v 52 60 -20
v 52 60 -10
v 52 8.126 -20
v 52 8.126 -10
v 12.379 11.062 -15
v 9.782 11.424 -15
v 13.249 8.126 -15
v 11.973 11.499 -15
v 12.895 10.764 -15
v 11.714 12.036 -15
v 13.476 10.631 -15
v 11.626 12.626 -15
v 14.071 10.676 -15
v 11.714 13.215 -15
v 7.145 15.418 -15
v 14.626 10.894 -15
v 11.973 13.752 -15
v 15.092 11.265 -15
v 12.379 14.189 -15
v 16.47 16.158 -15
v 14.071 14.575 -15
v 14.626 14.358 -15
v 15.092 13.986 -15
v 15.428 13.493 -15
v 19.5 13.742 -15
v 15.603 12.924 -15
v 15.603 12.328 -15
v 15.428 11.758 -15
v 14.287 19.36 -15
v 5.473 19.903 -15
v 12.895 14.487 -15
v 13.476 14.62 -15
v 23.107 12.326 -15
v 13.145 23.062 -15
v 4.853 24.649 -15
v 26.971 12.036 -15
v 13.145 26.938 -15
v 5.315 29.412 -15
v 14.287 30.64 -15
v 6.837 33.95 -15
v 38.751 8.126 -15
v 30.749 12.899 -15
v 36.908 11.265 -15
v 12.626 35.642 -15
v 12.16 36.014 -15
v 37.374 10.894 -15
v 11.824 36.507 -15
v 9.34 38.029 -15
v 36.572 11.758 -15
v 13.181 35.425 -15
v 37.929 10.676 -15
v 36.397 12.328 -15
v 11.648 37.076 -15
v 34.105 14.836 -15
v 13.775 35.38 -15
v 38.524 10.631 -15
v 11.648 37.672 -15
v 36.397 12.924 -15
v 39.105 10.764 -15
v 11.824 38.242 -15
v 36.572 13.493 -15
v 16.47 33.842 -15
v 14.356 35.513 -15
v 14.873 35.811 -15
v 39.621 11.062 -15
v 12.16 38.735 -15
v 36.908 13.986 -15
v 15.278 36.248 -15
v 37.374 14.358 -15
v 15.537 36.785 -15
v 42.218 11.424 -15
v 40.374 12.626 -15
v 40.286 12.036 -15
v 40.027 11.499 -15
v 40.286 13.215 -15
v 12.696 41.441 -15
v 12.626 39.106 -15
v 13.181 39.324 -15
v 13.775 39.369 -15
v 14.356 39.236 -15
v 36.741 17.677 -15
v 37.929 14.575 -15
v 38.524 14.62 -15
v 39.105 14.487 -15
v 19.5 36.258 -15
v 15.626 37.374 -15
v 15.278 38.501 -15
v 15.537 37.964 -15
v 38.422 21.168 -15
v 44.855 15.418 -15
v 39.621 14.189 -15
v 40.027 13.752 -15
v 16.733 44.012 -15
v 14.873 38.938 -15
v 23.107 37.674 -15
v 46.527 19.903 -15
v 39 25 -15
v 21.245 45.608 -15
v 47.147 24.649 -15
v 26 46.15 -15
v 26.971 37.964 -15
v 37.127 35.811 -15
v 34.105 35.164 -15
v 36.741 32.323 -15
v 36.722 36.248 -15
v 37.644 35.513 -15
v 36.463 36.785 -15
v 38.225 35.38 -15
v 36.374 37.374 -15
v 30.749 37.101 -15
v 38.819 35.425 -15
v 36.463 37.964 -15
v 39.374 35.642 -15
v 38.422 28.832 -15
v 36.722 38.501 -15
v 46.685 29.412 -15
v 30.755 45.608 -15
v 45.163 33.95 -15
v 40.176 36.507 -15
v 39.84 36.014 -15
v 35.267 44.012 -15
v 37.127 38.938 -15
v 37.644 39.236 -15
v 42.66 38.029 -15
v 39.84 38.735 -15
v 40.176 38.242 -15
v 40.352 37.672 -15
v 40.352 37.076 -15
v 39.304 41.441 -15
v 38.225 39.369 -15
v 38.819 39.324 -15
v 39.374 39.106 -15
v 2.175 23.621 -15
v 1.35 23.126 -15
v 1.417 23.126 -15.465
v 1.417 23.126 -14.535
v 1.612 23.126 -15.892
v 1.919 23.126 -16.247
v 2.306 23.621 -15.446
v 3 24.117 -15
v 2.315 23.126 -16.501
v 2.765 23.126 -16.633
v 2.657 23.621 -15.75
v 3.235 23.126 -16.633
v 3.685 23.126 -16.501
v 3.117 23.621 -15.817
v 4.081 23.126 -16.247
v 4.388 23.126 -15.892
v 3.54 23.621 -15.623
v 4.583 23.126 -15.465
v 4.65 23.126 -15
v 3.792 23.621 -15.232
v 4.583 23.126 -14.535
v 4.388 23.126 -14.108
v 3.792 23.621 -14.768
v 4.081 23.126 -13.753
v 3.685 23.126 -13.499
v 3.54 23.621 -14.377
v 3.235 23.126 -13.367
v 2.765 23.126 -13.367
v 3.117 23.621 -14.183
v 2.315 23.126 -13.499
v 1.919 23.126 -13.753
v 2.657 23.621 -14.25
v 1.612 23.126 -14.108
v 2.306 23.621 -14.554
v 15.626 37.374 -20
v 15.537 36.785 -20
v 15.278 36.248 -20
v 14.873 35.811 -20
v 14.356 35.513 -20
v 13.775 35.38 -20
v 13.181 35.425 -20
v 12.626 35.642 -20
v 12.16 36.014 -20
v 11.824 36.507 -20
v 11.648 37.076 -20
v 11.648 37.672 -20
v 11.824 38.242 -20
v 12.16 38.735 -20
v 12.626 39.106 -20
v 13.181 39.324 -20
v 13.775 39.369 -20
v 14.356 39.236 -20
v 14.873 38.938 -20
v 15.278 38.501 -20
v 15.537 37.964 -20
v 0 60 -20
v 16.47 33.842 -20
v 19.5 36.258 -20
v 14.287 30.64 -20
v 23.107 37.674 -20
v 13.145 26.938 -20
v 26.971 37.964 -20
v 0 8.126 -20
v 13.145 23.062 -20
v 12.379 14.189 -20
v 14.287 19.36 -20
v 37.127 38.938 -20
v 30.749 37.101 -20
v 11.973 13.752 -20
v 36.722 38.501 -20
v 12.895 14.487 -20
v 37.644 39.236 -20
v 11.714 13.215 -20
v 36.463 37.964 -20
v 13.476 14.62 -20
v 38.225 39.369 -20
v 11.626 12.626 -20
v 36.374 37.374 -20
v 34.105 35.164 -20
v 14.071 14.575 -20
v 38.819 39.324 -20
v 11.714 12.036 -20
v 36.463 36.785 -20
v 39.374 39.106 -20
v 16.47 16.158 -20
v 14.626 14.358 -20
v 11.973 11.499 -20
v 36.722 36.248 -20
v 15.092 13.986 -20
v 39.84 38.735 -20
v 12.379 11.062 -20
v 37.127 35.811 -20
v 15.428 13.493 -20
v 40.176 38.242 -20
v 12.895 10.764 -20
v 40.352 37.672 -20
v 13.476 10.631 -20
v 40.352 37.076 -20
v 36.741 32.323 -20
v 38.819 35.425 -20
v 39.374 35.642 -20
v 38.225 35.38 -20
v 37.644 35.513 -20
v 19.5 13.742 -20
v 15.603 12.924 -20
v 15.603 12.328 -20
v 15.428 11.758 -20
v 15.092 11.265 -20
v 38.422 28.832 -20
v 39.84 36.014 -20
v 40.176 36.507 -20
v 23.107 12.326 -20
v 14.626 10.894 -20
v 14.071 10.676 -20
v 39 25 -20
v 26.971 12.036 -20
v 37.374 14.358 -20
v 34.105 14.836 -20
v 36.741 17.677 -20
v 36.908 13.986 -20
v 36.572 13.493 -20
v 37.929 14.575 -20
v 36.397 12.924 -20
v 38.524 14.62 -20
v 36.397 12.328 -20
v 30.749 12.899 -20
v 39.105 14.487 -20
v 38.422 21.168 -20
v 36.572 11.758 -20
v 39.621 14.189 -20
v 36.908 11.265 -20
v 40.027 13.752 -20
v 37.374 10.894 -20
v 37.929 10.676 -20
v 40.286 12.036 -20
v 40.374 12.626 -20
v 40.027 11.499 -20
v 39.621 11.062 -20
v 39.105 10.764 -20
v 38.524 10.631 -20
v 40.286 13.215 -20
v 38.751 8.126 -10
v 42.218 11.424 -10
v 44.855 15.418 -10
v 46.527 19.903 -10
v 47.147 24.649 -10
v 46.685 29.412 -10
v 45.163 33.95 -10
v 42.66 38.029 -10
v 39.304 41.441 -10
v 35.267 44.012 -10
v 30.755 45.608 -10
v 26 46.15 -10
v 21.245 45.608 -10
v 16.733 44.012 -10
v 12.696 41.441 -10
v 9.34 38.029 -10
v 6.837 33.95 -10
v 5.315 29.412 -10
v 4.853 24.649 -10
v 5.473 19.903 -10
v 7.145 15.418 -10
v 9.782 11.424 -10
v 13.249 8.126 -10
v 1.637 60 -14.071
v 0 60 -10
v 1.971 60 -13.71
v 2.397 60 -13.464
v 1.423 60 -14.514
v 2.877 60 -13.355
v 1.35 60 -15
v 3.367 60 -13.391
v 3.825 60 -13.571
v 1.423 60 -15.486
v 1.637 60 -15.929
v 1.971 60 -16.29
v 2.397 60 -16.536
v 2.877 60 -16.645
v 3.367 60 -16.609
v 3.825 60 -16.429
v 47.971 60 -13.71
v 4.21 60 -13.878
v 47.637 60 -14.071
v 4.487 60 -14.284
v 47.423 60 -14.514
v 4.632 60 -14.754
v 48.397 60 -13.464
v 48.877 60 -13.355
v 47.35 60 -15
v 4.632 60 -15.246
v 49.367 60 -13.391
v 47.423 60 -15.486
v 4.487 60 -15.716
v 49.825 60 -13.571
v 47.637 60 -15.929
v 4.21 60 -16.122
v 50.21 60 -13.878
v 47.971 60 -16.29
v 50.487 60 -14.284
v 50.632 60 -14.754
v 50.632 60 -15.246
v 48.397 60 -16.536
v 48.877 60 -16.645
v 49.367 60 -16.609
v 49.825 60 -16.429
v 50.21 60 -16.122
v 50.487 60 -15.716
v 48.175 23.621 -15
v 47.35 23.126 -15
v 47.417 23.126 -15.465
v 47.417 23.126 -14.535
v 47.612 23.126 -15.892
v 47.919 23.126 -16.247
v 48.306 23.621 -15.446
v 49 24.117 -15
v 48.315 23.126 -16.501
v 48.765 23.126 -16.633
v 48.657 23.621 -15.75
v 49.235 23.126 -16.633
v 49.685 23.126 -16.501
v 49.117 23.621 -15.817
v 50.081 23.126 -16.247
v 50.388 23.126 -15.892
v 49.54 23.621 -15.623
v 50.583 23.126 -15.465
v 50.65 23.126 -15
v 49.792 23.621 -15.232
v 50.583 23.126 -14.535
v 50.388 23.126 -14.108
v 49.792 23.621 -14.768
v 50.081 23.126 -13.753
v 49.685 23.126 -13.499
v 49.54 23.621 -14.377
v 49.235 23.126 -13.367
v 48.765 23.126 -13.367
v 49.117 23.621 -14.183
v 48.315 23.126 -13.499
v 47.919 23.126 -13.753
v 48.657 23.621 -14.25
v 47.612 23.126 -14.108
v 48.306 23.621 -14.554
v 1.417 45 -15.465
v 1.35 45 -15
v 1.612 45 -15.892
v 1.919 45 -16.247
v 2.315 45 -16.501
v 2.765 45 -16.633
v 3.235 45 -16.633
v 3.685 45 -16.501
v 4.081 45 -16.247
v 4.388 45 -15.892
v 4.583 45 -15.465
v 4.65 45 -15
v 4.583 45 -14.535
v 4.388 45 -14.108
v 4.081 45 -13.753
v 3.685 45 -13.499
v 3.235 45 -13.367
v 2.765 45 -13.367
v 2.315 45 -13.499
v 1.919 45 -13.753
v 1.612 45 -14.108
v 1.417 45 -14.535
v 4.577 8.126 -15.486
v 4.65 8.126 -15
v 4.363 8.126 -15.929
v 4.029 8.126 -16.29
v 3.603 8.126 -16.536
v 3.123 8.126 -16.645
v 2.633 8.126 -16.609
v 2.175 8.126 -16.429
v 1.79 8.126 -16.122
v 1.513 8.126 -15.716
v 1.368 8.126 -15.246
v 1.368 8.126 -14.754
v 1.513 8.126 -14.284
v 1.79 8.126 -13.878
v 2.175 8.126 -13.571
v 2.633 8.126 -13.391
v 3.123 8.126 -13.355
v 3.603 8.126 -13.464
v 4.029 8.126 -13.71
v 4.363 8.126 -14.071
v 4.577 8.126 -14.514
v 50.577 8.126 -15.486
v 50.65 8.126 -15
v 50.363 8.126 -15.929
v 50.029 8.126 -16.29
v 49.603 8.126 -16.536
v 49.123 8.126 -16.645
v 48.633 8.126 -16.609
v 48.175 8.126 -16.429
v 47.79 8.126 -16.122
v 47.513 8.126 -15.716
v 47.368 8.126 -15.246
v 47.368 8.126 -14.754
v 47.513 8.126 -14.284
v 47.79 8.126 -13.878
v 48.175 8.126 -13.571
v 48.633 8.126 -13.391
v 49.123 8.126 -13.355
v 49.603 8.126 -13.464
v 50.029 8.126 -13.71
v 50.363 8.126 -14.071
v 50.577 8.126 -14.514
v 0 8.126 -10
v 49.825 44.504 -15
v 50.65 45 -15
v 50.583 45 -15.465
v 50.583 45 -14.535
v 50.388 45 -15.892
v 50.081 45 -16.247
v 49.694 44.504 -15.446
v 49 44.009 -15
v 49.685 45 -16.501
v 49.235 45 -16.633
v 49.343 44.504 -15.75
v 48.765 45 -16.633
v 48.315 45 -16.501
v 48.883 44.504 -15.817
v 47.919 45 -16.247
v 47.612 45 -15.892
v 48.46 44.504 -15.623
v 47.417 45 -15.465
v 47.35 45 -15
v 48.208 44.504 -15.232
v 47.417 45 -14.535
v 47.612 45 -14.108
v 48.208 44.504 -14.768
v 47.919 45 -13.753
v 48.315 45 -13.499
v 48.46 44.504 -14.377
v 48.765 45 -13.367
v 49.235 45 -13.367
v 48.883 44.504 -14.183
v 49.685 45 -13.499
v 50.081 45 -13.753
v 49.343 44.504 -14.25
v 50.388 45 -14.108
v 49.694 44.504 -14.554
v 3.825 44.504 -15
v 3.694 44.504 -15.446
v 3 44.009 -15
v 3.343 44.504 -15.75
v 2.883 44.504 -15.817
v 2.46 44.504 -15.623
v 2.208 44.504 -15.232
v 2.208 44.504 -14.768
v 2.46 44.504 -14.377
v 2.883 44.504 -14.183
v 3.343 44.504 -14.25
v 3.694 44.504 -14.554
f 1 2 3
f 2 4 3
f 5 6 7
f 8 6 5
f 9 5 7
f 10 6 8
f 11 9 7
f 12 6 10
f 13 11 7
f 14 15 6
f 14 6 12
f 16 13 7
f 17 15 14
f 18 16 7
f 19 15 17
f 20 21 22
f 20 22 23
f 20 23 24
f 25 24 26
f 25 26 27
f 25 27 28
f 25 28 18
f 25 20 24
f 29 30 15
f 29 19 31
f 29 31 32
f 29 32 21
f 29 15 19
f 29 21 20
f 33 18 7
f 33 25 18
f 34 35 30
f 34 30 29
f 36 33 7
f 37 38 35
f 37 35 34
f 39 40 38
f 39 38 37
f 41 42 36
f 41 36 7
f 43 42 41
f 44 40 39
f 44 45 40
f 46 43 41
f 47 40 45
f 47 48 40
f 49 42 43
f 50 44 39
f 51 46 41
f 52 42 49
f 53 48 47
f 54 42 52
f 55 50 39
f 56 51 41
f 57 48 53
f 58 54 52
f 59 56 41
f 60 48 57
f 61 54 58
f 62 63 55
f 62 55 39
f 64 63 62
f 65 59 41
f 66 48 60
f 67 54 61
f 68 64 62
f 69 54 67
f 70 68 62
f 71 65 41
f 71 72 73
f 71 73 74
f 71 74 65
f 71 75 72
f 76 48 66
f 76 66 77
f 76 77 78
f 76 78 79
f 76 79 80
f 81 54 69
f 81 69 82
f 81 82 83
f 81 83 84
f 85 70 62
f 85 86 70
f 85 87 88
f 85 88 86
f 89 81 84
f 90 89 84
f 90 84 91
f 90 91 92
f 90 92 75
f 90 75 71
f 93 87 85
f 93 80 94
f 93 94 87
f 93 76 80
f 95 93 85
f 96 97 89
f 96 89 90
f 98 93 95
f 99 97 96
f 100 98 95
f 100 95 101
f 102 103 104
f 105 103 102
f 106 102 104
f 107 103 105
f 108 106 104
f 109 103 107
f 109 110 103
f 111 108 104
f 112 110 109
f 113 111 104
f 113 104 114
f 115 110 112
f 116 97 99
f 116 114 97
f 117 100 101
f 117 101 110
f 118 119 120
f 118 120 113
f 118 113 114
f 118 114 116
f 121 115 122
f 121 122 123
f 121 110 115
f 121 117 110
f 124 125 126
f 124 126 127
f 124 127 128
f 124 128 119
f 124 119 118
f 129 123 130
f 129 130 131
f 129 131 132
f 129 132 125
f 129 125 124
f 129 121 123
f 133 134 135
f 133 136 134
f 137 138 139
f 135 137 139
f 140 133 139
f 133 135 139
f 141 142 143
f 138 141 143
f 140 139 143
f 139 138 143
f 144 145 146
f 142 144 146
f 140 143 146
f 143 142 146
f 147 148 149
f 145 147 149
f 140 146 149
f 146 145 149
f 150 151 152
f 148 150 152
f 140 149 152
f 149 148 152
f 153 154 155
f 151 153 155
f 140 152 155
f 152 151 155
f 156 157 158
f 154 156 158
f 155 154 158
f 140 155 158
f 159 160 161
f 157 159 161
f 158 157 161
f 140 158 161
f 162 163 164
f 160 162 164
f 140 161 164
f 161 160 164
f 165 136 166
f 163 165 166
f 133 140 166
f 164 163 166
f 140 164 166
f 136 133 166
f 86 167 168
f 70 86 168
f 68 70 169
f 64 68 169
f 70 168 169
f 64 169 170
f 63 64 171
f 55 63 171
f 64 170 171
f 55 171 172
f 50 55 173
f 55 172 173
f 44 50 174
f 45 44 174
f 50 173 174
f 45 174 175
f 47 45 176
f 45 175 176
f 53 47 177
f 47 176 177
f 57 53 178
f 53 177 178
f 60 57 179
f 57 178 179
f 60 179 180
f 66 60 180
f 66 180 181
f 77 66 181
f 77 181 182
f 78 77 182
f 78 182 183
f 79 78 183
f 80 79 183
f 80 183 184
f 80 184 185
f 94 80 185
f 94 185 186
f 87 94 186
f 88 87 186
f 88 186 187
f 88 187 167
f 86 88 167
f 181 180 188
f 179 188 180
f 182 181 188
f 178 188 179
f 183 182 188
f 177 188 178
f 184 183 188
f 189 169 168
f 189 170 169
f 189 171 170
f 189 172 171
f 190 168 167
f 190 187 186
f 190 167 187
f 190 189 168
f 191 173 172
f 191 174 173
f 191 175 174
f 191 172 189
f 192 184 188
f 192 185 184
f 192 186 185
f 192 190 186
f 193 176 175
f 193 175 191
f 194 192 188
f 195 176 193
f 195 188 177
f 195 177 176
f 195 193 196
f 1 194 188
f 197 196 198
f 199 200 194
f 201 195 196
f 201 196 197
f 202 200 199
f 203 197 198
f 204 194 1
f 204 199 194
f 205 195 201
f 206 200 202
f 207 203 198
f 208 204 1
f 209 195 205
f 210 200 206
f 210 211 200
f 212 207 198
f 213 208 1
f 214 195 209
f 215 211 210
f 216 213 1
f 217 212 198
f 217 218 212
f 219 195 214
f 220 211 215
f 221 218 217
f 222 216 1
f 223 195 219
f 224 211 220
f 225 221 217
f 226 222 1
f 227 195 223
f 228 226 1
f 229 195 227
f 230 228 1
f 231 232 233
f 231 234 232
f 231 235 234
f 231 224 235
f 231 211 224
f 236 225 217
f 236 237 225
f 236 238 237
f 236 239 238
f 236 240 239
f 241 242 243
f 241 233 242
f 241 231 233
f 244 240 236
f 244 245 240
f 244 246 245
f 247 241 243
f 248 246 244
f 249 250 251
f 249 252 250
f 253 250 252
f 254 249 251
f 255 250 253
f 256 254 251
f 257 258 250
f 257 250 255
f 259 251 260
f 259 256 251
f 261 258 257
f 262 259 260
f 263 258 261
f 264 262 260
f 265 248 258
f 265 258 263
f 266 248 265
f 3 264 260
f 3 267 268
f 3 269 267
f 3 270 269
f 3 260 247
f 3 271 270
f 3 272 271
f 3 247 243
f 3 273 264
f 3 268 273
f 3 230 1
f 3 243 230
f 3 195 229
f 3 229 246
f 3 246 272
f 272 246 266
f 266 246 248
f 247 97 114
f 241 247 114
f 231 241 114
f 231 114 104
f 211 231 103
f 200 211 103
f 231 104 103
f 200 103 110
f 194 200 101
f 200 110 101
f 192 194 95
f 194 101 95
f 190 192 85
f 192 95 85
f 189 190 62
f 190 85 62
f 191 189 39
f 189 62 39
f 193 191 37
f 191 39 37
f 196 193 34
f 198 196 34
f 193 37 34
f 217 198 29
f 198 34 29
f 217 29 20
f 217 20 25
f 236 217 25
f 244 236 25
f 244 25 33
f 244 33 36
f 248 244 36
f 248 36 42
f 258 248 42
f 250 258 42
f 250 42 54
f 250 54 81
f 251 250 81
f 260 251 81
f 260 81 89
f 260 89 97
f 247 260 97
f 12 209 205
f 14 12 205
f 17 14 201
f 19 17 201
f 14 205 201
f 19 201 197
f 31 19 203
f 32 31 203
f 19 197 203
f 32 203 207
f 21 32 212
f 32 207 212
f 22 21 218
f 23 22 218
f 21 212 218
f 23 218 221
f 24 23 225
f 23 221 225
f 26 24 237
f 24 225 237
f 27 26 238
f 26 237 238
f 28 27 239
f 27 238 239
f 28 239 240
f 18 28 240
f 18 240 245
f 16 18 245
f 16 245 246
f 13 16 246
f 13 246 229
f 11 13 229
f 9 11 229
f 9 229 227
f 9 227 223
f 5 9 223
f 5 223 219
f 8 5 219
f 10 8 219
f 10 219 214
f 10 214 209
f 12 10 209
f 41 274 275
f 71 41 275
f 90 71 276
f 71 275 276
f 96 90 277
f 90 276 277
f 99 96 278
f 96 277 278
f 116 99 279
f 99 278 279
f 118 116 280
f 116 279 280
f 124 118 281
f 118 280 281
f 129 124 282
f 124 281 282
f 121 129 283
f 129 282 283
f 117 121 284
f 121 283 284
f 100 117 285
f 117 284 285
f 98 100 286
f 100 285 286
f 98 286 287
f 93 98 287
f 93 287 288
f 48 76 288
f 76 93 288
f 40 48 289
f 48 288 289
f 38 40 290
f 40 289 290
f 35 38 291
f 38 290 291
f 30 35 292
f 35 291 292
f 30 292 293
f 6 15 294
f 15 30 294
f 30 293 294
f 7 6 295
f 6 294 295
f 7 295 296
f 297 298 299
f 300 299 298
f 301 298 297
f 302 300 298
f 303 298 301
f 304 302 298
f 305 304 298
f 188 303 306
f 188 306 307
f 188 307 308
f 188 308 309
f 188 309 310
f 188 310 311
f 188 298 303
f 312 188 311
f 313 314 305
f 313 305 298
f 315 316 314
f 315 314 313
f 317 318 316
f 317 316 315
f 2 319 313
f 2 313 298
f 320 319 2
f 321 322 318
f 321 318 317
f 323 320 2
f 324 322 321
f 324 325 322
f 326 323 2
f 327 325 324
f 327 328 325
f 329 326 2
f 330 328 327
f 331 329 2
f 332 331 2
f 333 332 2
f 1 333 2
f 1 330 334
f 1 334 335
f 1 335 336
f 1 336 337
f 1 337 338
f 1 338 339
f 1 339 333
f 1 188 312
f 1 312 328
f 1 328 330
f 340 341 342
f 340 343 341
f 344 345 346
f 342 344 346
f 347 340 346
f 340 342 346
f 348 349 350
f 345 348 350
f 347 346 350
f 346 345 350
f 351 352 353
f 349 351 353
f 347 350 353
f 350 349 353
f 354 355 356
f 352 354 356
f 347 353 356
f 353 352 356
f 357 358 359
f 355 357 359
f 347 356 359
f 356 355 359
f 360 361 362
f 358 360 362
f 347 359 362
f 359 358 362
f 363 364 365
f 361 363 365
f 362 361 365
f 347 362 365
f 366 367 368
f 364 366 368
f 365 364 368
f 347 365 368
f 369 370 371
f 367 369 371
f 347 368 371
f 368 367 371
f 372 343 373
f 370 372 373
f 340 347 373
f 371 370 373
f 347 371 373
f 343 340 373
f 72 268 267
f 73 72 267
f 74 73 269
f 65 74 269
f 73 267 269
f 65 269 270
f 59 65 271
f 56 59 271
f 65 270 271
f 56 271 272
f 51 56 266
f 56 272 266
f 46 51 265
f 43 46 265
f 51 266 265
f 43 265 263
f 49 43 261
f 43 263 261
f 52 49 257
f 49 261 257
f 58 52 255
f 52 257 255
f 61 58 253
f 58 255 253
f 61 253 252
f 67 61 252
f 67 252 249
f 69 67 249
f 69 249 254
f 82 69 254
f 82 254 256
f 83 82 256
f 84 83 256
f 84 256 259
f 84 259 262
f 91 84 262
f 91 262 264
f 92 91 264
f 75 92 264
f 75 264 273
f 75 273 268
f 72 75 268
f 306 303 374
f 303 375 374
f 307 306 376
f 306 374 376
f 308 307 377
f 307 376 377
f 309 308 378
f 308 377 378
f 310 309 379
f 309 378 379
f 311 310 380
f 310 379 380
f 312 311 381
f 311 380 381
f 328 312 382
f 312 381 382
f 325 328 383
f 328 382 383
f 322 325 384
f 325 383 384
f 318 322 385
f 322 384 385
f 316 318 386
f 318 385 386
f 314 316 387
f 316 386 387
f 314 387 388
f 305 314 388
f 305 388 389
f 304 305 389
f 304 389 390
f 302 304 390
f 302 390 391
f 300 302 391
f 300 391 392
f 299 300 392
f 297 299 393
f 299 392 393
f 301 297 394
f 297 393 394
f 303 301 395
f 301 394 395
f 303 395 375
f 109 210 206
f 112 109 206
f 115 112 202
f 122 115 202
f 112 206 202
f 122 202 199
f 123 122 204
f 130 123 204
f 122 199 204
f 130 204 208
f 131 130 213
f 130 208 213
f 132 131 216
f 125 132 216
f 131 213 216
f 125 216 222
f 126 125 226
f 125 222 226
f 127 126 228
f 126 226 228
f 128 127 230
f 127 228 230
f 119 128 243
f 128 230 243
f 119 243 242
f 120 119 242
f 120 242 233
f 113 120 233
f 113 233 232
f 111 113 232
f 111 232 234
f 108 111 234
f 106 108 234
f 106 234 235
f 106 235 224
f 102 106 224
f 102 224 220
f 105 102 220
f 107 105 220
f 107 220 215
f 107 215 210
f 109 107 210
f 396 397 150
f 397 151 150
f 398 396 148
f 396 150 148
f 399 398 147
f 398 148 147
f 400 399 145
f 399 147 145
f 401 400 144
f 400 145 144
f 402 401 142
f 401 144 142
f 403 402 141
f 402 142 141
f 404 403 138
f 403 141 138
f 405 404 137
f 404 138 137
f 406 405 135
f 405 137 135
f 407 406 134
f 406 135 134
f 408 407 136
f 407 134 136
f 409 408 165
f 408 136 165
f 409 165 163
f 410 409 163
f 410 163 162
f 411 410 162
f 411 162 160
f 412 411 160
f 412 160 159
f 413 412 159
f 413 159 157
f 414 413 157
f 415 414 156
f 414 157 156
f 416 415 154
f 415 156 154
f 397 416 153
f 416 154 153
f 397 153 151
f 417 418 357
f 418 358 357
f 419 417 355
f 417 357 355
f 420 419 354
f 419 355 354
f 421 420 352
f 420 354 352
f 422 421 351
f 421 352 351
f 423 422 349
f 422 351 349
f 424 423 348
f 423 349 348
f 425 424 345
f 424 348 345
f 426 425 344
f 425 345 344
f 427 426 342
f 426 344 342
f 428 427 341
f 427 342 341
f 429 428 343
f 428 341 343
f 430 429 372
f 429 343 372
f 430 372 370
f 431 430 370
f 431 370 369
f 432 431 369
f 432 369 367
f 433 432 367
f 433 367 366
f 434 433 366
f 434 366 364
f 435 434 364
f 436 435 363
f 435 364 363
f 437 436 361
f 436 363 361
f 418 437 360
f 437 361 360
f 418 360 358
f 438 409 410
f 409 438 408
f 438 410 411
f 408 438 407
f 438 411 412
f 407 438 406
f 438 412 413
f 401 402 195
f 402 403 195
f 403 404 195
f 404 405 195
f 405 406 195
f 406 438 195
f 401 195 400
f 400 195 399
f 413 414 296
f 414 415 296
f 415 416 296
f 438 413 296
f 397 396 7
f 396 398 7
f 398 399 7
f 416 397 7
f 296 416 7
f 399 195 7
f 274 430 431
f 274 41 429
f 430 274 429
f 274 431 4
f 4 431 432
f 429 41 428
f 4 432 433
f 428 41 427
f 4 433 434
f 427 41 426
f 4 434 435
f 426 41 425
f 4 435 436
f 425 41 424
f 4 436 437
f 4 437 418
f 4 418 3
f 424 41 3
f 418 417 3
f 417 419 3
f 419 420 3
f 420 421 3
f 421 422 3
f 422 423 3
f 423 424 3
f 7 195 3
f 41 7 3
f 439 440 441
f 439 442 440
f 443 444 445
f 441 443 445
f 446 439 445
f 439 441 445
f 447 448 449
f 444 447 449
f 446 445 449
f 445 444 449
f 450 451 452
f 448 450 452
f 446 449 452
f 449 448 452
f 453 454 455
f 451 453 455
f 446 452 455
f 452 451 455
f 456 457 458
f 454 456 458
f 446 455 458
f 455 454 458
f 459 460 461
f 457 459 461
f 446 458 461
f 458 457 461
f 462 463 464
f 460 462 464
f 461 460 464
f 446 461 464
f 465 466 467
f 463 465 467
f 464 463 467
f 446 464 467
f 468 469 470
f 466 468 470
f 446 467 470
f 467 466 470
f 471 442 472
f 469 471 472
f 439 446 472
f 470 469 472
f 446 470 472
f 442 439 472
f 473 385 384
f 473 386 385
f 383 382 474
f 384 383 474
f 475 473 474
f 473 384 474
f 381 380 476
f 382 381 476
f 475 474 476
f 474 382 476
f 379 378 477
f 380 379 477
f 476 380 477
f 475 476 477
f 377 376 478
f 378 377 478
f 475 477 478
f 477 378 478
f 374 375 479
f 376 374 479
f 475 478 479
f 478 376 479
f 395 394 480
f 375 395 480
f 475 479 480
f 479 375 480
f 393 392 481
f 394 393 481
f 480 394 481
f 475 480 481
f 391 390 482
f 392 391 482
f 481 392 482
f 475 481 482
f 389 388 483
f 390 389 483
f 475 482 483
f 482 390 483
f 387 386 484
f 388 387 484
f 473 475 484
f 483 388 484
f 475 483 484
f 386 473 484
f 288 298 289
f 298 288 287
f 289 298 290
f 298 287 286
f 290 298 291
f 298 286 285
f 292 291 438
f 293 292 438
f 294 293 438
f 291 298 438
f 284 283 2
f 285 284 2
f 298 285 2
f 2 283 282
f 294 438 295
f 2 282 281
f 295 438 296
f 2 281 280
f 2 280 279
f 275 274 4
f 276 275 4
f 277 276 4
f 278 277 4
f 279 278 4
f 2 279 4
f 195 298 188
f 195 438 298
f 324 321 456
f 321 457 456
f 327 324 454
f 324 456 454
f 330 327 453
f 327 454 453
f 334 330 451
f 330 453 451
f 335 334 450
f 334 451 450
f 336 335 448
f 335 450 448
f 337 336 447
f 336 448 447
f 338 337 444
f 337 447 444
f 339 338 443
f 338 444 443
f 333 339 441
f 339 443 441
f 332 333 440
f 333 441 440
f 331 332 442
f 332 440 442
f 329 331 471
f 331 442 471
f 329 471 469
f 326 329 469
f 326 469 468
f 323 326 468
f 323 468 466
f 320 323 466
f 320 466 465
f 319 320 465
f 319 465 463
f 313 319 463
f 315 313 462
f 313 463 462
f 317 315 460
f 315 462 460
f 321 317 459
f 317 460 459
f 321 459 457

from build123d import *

# Parameters (mm, degrees)
SKETCH_1_W           = 52
SKETCH_1_H           = 20
EXTRUDE_4_DEPTH      = 50
SKETCH_11_R          = 21.15
CUT_EXTRUDE_7_DEPTH  = 13
SKETCH_14_R          = 13
CUT_EXTRUDE_9_DEPTH  = 15
CUT_EXTRUDE_13_DEPTH = 35
MM_6_D               = 3.3
MM_6_DEPTH           = 15
MM_6_TIP             = 0.991420021
SKETCH_62_W          = 52
SKETCH_62_H          = 10
CUT_EXTRUDE_14_DEPTH = 97
SKETCH_63_R          = 21.15
CUT_EXTRUDE_15_DEPTH = 2
SKETCH_54_R          = 2
CUT_EXTRUDE_18_DEPTH = 10
SKETCH_76_W          = 52
SKETCH_76_H          = 10
EXTRUDE_7_DEPTH      = 10
F_1_0MM_1_D          = 3.3
F_1_0MM_1_DEPTH      = 15
F_1_0MM_1_TIP        = 0.991420021


with BuildPart() as part:
    # 草图1 → 凸台-拉伸4 (new body)
    with BuildSketch(Plane(origin=(0, 0, 0), x_dir=(1, 0, 0), z_dir=(0, 1, 0))):
        with Locations((26, 10)):
            Rectangle(SKETCH_1_W, SKETCH_1_H)
    extrude(amount=EXTRUDE_4_DEPTH)

    # 草图11 → 切除-拉伸7 (cut)
    with BuildSketch(Plane.XY):
        with Locations((26, 25)):
            Circle(SKETCH_11_R)
    extrude(amount=-CUT_EXTRUDE_7_DEPTH, mode=Mode.SUBTRACT)

    # 草图14 → 切除-拉伸9 (cut)
    with BuildSketch(Plane.XY.offset(-13)):
        with Locations((26, 25)):
            Circle(SKETCH_14_R)
    extrude(amount=-CUT_EXTRUDE_9_DEPTH, mode=Mode.SUBTRACT)

    # 草图56 → 切除-拉伸13 (cut)
    with BuildSketch(Plane(origin=(0, 0, -20), x_dir=(-1, 0, 0), z_dir=(0, 0, -1))):
        Polygon((-38.374368671, 8.125631329), (-52, 8.125631329), (-52, 0), (0, 0), (0, 8.125631329), align=None)
    extrude(amount=-CUT_EXTRUDE_13_DEPTH, mode=Mode.SUBTRACT)

    # 大小mm 暗销孔6
    with Locations(Plane(origin=(3, 8.125631329, -5), x_dir=(-1, 0, 0), z_dir=(0, -1, 0))):
        with Locations((0, 0), (0, 10), (-46, 0), (-46, 10)):
            Hole(MM_6_D / 2, depth=MM_6_DEPTH)
            with Locations((0, 0, -(MM_6_DEPTH + MM_6_TIP / 2))):  # 118° drill point
                Cone(0, MM_6_D / 2, MM_6_TIP, mode=Mode.SUBTRACT)

    # 草图62 → 切除-拉伸14 (cut)
    with BuildSketch(Plane(origin=(0, 50, 0), x_dir=(1, 0, 0), z_dir=(0, 1, 0))):
        with Locations((26, 5)):
            Rectangle(SKETCH_62_W, SKETCH_62_H)
    extrude(amount=-CUT_EXTRUDE_14_DEPTH, mode=Mode.SUBTRACT)

    # 草图63 → 切除-拉伸15 (cut)
    with BuildSketch(Plane.XY.offset(-13)):
        with Locations((26, 25)):
            Circle(SKETCH_63_R)
    extrude(amount=-CUT_EXTRUDE_15_DEPTH, mode=Mode.SUBTRACT)

    # 草图54 → 切除-拉伸18 (cut)
    with BuildSketch(Plane(origin=(0, 0, -20), x_dir=(-1, 0, 0), z_dir=(0, 0, -1))):
        with Locations((-38.374368671, 37.374368671)):
            Circle(SKETCH_54_R)
        with Locations(Location((-13.625631329, 37.374368671, 0), (0, 0, 180))):
            Circle(SKETCH_54_R)
        with Locations((-13.625631329, 12.625631329)):
            Circle(SKETCH_54_R)
        with Locations(Location((-38.374368671, 12.625631329, 0), (0, 0, 180))):
            Circle(SKETCH_54_R)
    extrude(amount=-CUT_EXTRUDE_18_DEPTH, mode=Mode.SUBTRACT)

    # 草图76 → 凸台-拉伸7 (add)
    with BuildSketch(Plane(origin=(0, 50, 0), x_dir=(1, 0, 0), z_dir=(0, 1, 0))):
        with Locations((26, 15)):
            Rectangle(SKETCH_76_W, SKETCH_76_H)
    extrude(amount=EXTRUDE_7_DEPTH)

    # Ø1.0mm 暗销孔1
    with Locations(Plane(origin=(0, 60, 0), x_dir=(1, 0, 0), z_dir=(0, 1, 0))):
        with Locations((3, 15), (49, 15)):
            Hole(F_1_0MM_1_D / 2, depth=F_1_0MM_1_DEPTH)
            with Locations((0, 0, -(F_1_0MM_1_DEPTH + F_1_0MM_1_TIP / 2))):  # 118° drill point
                Cone(0, F_1_0MM_1_D / 2, F_1_0MM_1_TIP, mode=Mode.SUBTRACT)


solid = part.part
